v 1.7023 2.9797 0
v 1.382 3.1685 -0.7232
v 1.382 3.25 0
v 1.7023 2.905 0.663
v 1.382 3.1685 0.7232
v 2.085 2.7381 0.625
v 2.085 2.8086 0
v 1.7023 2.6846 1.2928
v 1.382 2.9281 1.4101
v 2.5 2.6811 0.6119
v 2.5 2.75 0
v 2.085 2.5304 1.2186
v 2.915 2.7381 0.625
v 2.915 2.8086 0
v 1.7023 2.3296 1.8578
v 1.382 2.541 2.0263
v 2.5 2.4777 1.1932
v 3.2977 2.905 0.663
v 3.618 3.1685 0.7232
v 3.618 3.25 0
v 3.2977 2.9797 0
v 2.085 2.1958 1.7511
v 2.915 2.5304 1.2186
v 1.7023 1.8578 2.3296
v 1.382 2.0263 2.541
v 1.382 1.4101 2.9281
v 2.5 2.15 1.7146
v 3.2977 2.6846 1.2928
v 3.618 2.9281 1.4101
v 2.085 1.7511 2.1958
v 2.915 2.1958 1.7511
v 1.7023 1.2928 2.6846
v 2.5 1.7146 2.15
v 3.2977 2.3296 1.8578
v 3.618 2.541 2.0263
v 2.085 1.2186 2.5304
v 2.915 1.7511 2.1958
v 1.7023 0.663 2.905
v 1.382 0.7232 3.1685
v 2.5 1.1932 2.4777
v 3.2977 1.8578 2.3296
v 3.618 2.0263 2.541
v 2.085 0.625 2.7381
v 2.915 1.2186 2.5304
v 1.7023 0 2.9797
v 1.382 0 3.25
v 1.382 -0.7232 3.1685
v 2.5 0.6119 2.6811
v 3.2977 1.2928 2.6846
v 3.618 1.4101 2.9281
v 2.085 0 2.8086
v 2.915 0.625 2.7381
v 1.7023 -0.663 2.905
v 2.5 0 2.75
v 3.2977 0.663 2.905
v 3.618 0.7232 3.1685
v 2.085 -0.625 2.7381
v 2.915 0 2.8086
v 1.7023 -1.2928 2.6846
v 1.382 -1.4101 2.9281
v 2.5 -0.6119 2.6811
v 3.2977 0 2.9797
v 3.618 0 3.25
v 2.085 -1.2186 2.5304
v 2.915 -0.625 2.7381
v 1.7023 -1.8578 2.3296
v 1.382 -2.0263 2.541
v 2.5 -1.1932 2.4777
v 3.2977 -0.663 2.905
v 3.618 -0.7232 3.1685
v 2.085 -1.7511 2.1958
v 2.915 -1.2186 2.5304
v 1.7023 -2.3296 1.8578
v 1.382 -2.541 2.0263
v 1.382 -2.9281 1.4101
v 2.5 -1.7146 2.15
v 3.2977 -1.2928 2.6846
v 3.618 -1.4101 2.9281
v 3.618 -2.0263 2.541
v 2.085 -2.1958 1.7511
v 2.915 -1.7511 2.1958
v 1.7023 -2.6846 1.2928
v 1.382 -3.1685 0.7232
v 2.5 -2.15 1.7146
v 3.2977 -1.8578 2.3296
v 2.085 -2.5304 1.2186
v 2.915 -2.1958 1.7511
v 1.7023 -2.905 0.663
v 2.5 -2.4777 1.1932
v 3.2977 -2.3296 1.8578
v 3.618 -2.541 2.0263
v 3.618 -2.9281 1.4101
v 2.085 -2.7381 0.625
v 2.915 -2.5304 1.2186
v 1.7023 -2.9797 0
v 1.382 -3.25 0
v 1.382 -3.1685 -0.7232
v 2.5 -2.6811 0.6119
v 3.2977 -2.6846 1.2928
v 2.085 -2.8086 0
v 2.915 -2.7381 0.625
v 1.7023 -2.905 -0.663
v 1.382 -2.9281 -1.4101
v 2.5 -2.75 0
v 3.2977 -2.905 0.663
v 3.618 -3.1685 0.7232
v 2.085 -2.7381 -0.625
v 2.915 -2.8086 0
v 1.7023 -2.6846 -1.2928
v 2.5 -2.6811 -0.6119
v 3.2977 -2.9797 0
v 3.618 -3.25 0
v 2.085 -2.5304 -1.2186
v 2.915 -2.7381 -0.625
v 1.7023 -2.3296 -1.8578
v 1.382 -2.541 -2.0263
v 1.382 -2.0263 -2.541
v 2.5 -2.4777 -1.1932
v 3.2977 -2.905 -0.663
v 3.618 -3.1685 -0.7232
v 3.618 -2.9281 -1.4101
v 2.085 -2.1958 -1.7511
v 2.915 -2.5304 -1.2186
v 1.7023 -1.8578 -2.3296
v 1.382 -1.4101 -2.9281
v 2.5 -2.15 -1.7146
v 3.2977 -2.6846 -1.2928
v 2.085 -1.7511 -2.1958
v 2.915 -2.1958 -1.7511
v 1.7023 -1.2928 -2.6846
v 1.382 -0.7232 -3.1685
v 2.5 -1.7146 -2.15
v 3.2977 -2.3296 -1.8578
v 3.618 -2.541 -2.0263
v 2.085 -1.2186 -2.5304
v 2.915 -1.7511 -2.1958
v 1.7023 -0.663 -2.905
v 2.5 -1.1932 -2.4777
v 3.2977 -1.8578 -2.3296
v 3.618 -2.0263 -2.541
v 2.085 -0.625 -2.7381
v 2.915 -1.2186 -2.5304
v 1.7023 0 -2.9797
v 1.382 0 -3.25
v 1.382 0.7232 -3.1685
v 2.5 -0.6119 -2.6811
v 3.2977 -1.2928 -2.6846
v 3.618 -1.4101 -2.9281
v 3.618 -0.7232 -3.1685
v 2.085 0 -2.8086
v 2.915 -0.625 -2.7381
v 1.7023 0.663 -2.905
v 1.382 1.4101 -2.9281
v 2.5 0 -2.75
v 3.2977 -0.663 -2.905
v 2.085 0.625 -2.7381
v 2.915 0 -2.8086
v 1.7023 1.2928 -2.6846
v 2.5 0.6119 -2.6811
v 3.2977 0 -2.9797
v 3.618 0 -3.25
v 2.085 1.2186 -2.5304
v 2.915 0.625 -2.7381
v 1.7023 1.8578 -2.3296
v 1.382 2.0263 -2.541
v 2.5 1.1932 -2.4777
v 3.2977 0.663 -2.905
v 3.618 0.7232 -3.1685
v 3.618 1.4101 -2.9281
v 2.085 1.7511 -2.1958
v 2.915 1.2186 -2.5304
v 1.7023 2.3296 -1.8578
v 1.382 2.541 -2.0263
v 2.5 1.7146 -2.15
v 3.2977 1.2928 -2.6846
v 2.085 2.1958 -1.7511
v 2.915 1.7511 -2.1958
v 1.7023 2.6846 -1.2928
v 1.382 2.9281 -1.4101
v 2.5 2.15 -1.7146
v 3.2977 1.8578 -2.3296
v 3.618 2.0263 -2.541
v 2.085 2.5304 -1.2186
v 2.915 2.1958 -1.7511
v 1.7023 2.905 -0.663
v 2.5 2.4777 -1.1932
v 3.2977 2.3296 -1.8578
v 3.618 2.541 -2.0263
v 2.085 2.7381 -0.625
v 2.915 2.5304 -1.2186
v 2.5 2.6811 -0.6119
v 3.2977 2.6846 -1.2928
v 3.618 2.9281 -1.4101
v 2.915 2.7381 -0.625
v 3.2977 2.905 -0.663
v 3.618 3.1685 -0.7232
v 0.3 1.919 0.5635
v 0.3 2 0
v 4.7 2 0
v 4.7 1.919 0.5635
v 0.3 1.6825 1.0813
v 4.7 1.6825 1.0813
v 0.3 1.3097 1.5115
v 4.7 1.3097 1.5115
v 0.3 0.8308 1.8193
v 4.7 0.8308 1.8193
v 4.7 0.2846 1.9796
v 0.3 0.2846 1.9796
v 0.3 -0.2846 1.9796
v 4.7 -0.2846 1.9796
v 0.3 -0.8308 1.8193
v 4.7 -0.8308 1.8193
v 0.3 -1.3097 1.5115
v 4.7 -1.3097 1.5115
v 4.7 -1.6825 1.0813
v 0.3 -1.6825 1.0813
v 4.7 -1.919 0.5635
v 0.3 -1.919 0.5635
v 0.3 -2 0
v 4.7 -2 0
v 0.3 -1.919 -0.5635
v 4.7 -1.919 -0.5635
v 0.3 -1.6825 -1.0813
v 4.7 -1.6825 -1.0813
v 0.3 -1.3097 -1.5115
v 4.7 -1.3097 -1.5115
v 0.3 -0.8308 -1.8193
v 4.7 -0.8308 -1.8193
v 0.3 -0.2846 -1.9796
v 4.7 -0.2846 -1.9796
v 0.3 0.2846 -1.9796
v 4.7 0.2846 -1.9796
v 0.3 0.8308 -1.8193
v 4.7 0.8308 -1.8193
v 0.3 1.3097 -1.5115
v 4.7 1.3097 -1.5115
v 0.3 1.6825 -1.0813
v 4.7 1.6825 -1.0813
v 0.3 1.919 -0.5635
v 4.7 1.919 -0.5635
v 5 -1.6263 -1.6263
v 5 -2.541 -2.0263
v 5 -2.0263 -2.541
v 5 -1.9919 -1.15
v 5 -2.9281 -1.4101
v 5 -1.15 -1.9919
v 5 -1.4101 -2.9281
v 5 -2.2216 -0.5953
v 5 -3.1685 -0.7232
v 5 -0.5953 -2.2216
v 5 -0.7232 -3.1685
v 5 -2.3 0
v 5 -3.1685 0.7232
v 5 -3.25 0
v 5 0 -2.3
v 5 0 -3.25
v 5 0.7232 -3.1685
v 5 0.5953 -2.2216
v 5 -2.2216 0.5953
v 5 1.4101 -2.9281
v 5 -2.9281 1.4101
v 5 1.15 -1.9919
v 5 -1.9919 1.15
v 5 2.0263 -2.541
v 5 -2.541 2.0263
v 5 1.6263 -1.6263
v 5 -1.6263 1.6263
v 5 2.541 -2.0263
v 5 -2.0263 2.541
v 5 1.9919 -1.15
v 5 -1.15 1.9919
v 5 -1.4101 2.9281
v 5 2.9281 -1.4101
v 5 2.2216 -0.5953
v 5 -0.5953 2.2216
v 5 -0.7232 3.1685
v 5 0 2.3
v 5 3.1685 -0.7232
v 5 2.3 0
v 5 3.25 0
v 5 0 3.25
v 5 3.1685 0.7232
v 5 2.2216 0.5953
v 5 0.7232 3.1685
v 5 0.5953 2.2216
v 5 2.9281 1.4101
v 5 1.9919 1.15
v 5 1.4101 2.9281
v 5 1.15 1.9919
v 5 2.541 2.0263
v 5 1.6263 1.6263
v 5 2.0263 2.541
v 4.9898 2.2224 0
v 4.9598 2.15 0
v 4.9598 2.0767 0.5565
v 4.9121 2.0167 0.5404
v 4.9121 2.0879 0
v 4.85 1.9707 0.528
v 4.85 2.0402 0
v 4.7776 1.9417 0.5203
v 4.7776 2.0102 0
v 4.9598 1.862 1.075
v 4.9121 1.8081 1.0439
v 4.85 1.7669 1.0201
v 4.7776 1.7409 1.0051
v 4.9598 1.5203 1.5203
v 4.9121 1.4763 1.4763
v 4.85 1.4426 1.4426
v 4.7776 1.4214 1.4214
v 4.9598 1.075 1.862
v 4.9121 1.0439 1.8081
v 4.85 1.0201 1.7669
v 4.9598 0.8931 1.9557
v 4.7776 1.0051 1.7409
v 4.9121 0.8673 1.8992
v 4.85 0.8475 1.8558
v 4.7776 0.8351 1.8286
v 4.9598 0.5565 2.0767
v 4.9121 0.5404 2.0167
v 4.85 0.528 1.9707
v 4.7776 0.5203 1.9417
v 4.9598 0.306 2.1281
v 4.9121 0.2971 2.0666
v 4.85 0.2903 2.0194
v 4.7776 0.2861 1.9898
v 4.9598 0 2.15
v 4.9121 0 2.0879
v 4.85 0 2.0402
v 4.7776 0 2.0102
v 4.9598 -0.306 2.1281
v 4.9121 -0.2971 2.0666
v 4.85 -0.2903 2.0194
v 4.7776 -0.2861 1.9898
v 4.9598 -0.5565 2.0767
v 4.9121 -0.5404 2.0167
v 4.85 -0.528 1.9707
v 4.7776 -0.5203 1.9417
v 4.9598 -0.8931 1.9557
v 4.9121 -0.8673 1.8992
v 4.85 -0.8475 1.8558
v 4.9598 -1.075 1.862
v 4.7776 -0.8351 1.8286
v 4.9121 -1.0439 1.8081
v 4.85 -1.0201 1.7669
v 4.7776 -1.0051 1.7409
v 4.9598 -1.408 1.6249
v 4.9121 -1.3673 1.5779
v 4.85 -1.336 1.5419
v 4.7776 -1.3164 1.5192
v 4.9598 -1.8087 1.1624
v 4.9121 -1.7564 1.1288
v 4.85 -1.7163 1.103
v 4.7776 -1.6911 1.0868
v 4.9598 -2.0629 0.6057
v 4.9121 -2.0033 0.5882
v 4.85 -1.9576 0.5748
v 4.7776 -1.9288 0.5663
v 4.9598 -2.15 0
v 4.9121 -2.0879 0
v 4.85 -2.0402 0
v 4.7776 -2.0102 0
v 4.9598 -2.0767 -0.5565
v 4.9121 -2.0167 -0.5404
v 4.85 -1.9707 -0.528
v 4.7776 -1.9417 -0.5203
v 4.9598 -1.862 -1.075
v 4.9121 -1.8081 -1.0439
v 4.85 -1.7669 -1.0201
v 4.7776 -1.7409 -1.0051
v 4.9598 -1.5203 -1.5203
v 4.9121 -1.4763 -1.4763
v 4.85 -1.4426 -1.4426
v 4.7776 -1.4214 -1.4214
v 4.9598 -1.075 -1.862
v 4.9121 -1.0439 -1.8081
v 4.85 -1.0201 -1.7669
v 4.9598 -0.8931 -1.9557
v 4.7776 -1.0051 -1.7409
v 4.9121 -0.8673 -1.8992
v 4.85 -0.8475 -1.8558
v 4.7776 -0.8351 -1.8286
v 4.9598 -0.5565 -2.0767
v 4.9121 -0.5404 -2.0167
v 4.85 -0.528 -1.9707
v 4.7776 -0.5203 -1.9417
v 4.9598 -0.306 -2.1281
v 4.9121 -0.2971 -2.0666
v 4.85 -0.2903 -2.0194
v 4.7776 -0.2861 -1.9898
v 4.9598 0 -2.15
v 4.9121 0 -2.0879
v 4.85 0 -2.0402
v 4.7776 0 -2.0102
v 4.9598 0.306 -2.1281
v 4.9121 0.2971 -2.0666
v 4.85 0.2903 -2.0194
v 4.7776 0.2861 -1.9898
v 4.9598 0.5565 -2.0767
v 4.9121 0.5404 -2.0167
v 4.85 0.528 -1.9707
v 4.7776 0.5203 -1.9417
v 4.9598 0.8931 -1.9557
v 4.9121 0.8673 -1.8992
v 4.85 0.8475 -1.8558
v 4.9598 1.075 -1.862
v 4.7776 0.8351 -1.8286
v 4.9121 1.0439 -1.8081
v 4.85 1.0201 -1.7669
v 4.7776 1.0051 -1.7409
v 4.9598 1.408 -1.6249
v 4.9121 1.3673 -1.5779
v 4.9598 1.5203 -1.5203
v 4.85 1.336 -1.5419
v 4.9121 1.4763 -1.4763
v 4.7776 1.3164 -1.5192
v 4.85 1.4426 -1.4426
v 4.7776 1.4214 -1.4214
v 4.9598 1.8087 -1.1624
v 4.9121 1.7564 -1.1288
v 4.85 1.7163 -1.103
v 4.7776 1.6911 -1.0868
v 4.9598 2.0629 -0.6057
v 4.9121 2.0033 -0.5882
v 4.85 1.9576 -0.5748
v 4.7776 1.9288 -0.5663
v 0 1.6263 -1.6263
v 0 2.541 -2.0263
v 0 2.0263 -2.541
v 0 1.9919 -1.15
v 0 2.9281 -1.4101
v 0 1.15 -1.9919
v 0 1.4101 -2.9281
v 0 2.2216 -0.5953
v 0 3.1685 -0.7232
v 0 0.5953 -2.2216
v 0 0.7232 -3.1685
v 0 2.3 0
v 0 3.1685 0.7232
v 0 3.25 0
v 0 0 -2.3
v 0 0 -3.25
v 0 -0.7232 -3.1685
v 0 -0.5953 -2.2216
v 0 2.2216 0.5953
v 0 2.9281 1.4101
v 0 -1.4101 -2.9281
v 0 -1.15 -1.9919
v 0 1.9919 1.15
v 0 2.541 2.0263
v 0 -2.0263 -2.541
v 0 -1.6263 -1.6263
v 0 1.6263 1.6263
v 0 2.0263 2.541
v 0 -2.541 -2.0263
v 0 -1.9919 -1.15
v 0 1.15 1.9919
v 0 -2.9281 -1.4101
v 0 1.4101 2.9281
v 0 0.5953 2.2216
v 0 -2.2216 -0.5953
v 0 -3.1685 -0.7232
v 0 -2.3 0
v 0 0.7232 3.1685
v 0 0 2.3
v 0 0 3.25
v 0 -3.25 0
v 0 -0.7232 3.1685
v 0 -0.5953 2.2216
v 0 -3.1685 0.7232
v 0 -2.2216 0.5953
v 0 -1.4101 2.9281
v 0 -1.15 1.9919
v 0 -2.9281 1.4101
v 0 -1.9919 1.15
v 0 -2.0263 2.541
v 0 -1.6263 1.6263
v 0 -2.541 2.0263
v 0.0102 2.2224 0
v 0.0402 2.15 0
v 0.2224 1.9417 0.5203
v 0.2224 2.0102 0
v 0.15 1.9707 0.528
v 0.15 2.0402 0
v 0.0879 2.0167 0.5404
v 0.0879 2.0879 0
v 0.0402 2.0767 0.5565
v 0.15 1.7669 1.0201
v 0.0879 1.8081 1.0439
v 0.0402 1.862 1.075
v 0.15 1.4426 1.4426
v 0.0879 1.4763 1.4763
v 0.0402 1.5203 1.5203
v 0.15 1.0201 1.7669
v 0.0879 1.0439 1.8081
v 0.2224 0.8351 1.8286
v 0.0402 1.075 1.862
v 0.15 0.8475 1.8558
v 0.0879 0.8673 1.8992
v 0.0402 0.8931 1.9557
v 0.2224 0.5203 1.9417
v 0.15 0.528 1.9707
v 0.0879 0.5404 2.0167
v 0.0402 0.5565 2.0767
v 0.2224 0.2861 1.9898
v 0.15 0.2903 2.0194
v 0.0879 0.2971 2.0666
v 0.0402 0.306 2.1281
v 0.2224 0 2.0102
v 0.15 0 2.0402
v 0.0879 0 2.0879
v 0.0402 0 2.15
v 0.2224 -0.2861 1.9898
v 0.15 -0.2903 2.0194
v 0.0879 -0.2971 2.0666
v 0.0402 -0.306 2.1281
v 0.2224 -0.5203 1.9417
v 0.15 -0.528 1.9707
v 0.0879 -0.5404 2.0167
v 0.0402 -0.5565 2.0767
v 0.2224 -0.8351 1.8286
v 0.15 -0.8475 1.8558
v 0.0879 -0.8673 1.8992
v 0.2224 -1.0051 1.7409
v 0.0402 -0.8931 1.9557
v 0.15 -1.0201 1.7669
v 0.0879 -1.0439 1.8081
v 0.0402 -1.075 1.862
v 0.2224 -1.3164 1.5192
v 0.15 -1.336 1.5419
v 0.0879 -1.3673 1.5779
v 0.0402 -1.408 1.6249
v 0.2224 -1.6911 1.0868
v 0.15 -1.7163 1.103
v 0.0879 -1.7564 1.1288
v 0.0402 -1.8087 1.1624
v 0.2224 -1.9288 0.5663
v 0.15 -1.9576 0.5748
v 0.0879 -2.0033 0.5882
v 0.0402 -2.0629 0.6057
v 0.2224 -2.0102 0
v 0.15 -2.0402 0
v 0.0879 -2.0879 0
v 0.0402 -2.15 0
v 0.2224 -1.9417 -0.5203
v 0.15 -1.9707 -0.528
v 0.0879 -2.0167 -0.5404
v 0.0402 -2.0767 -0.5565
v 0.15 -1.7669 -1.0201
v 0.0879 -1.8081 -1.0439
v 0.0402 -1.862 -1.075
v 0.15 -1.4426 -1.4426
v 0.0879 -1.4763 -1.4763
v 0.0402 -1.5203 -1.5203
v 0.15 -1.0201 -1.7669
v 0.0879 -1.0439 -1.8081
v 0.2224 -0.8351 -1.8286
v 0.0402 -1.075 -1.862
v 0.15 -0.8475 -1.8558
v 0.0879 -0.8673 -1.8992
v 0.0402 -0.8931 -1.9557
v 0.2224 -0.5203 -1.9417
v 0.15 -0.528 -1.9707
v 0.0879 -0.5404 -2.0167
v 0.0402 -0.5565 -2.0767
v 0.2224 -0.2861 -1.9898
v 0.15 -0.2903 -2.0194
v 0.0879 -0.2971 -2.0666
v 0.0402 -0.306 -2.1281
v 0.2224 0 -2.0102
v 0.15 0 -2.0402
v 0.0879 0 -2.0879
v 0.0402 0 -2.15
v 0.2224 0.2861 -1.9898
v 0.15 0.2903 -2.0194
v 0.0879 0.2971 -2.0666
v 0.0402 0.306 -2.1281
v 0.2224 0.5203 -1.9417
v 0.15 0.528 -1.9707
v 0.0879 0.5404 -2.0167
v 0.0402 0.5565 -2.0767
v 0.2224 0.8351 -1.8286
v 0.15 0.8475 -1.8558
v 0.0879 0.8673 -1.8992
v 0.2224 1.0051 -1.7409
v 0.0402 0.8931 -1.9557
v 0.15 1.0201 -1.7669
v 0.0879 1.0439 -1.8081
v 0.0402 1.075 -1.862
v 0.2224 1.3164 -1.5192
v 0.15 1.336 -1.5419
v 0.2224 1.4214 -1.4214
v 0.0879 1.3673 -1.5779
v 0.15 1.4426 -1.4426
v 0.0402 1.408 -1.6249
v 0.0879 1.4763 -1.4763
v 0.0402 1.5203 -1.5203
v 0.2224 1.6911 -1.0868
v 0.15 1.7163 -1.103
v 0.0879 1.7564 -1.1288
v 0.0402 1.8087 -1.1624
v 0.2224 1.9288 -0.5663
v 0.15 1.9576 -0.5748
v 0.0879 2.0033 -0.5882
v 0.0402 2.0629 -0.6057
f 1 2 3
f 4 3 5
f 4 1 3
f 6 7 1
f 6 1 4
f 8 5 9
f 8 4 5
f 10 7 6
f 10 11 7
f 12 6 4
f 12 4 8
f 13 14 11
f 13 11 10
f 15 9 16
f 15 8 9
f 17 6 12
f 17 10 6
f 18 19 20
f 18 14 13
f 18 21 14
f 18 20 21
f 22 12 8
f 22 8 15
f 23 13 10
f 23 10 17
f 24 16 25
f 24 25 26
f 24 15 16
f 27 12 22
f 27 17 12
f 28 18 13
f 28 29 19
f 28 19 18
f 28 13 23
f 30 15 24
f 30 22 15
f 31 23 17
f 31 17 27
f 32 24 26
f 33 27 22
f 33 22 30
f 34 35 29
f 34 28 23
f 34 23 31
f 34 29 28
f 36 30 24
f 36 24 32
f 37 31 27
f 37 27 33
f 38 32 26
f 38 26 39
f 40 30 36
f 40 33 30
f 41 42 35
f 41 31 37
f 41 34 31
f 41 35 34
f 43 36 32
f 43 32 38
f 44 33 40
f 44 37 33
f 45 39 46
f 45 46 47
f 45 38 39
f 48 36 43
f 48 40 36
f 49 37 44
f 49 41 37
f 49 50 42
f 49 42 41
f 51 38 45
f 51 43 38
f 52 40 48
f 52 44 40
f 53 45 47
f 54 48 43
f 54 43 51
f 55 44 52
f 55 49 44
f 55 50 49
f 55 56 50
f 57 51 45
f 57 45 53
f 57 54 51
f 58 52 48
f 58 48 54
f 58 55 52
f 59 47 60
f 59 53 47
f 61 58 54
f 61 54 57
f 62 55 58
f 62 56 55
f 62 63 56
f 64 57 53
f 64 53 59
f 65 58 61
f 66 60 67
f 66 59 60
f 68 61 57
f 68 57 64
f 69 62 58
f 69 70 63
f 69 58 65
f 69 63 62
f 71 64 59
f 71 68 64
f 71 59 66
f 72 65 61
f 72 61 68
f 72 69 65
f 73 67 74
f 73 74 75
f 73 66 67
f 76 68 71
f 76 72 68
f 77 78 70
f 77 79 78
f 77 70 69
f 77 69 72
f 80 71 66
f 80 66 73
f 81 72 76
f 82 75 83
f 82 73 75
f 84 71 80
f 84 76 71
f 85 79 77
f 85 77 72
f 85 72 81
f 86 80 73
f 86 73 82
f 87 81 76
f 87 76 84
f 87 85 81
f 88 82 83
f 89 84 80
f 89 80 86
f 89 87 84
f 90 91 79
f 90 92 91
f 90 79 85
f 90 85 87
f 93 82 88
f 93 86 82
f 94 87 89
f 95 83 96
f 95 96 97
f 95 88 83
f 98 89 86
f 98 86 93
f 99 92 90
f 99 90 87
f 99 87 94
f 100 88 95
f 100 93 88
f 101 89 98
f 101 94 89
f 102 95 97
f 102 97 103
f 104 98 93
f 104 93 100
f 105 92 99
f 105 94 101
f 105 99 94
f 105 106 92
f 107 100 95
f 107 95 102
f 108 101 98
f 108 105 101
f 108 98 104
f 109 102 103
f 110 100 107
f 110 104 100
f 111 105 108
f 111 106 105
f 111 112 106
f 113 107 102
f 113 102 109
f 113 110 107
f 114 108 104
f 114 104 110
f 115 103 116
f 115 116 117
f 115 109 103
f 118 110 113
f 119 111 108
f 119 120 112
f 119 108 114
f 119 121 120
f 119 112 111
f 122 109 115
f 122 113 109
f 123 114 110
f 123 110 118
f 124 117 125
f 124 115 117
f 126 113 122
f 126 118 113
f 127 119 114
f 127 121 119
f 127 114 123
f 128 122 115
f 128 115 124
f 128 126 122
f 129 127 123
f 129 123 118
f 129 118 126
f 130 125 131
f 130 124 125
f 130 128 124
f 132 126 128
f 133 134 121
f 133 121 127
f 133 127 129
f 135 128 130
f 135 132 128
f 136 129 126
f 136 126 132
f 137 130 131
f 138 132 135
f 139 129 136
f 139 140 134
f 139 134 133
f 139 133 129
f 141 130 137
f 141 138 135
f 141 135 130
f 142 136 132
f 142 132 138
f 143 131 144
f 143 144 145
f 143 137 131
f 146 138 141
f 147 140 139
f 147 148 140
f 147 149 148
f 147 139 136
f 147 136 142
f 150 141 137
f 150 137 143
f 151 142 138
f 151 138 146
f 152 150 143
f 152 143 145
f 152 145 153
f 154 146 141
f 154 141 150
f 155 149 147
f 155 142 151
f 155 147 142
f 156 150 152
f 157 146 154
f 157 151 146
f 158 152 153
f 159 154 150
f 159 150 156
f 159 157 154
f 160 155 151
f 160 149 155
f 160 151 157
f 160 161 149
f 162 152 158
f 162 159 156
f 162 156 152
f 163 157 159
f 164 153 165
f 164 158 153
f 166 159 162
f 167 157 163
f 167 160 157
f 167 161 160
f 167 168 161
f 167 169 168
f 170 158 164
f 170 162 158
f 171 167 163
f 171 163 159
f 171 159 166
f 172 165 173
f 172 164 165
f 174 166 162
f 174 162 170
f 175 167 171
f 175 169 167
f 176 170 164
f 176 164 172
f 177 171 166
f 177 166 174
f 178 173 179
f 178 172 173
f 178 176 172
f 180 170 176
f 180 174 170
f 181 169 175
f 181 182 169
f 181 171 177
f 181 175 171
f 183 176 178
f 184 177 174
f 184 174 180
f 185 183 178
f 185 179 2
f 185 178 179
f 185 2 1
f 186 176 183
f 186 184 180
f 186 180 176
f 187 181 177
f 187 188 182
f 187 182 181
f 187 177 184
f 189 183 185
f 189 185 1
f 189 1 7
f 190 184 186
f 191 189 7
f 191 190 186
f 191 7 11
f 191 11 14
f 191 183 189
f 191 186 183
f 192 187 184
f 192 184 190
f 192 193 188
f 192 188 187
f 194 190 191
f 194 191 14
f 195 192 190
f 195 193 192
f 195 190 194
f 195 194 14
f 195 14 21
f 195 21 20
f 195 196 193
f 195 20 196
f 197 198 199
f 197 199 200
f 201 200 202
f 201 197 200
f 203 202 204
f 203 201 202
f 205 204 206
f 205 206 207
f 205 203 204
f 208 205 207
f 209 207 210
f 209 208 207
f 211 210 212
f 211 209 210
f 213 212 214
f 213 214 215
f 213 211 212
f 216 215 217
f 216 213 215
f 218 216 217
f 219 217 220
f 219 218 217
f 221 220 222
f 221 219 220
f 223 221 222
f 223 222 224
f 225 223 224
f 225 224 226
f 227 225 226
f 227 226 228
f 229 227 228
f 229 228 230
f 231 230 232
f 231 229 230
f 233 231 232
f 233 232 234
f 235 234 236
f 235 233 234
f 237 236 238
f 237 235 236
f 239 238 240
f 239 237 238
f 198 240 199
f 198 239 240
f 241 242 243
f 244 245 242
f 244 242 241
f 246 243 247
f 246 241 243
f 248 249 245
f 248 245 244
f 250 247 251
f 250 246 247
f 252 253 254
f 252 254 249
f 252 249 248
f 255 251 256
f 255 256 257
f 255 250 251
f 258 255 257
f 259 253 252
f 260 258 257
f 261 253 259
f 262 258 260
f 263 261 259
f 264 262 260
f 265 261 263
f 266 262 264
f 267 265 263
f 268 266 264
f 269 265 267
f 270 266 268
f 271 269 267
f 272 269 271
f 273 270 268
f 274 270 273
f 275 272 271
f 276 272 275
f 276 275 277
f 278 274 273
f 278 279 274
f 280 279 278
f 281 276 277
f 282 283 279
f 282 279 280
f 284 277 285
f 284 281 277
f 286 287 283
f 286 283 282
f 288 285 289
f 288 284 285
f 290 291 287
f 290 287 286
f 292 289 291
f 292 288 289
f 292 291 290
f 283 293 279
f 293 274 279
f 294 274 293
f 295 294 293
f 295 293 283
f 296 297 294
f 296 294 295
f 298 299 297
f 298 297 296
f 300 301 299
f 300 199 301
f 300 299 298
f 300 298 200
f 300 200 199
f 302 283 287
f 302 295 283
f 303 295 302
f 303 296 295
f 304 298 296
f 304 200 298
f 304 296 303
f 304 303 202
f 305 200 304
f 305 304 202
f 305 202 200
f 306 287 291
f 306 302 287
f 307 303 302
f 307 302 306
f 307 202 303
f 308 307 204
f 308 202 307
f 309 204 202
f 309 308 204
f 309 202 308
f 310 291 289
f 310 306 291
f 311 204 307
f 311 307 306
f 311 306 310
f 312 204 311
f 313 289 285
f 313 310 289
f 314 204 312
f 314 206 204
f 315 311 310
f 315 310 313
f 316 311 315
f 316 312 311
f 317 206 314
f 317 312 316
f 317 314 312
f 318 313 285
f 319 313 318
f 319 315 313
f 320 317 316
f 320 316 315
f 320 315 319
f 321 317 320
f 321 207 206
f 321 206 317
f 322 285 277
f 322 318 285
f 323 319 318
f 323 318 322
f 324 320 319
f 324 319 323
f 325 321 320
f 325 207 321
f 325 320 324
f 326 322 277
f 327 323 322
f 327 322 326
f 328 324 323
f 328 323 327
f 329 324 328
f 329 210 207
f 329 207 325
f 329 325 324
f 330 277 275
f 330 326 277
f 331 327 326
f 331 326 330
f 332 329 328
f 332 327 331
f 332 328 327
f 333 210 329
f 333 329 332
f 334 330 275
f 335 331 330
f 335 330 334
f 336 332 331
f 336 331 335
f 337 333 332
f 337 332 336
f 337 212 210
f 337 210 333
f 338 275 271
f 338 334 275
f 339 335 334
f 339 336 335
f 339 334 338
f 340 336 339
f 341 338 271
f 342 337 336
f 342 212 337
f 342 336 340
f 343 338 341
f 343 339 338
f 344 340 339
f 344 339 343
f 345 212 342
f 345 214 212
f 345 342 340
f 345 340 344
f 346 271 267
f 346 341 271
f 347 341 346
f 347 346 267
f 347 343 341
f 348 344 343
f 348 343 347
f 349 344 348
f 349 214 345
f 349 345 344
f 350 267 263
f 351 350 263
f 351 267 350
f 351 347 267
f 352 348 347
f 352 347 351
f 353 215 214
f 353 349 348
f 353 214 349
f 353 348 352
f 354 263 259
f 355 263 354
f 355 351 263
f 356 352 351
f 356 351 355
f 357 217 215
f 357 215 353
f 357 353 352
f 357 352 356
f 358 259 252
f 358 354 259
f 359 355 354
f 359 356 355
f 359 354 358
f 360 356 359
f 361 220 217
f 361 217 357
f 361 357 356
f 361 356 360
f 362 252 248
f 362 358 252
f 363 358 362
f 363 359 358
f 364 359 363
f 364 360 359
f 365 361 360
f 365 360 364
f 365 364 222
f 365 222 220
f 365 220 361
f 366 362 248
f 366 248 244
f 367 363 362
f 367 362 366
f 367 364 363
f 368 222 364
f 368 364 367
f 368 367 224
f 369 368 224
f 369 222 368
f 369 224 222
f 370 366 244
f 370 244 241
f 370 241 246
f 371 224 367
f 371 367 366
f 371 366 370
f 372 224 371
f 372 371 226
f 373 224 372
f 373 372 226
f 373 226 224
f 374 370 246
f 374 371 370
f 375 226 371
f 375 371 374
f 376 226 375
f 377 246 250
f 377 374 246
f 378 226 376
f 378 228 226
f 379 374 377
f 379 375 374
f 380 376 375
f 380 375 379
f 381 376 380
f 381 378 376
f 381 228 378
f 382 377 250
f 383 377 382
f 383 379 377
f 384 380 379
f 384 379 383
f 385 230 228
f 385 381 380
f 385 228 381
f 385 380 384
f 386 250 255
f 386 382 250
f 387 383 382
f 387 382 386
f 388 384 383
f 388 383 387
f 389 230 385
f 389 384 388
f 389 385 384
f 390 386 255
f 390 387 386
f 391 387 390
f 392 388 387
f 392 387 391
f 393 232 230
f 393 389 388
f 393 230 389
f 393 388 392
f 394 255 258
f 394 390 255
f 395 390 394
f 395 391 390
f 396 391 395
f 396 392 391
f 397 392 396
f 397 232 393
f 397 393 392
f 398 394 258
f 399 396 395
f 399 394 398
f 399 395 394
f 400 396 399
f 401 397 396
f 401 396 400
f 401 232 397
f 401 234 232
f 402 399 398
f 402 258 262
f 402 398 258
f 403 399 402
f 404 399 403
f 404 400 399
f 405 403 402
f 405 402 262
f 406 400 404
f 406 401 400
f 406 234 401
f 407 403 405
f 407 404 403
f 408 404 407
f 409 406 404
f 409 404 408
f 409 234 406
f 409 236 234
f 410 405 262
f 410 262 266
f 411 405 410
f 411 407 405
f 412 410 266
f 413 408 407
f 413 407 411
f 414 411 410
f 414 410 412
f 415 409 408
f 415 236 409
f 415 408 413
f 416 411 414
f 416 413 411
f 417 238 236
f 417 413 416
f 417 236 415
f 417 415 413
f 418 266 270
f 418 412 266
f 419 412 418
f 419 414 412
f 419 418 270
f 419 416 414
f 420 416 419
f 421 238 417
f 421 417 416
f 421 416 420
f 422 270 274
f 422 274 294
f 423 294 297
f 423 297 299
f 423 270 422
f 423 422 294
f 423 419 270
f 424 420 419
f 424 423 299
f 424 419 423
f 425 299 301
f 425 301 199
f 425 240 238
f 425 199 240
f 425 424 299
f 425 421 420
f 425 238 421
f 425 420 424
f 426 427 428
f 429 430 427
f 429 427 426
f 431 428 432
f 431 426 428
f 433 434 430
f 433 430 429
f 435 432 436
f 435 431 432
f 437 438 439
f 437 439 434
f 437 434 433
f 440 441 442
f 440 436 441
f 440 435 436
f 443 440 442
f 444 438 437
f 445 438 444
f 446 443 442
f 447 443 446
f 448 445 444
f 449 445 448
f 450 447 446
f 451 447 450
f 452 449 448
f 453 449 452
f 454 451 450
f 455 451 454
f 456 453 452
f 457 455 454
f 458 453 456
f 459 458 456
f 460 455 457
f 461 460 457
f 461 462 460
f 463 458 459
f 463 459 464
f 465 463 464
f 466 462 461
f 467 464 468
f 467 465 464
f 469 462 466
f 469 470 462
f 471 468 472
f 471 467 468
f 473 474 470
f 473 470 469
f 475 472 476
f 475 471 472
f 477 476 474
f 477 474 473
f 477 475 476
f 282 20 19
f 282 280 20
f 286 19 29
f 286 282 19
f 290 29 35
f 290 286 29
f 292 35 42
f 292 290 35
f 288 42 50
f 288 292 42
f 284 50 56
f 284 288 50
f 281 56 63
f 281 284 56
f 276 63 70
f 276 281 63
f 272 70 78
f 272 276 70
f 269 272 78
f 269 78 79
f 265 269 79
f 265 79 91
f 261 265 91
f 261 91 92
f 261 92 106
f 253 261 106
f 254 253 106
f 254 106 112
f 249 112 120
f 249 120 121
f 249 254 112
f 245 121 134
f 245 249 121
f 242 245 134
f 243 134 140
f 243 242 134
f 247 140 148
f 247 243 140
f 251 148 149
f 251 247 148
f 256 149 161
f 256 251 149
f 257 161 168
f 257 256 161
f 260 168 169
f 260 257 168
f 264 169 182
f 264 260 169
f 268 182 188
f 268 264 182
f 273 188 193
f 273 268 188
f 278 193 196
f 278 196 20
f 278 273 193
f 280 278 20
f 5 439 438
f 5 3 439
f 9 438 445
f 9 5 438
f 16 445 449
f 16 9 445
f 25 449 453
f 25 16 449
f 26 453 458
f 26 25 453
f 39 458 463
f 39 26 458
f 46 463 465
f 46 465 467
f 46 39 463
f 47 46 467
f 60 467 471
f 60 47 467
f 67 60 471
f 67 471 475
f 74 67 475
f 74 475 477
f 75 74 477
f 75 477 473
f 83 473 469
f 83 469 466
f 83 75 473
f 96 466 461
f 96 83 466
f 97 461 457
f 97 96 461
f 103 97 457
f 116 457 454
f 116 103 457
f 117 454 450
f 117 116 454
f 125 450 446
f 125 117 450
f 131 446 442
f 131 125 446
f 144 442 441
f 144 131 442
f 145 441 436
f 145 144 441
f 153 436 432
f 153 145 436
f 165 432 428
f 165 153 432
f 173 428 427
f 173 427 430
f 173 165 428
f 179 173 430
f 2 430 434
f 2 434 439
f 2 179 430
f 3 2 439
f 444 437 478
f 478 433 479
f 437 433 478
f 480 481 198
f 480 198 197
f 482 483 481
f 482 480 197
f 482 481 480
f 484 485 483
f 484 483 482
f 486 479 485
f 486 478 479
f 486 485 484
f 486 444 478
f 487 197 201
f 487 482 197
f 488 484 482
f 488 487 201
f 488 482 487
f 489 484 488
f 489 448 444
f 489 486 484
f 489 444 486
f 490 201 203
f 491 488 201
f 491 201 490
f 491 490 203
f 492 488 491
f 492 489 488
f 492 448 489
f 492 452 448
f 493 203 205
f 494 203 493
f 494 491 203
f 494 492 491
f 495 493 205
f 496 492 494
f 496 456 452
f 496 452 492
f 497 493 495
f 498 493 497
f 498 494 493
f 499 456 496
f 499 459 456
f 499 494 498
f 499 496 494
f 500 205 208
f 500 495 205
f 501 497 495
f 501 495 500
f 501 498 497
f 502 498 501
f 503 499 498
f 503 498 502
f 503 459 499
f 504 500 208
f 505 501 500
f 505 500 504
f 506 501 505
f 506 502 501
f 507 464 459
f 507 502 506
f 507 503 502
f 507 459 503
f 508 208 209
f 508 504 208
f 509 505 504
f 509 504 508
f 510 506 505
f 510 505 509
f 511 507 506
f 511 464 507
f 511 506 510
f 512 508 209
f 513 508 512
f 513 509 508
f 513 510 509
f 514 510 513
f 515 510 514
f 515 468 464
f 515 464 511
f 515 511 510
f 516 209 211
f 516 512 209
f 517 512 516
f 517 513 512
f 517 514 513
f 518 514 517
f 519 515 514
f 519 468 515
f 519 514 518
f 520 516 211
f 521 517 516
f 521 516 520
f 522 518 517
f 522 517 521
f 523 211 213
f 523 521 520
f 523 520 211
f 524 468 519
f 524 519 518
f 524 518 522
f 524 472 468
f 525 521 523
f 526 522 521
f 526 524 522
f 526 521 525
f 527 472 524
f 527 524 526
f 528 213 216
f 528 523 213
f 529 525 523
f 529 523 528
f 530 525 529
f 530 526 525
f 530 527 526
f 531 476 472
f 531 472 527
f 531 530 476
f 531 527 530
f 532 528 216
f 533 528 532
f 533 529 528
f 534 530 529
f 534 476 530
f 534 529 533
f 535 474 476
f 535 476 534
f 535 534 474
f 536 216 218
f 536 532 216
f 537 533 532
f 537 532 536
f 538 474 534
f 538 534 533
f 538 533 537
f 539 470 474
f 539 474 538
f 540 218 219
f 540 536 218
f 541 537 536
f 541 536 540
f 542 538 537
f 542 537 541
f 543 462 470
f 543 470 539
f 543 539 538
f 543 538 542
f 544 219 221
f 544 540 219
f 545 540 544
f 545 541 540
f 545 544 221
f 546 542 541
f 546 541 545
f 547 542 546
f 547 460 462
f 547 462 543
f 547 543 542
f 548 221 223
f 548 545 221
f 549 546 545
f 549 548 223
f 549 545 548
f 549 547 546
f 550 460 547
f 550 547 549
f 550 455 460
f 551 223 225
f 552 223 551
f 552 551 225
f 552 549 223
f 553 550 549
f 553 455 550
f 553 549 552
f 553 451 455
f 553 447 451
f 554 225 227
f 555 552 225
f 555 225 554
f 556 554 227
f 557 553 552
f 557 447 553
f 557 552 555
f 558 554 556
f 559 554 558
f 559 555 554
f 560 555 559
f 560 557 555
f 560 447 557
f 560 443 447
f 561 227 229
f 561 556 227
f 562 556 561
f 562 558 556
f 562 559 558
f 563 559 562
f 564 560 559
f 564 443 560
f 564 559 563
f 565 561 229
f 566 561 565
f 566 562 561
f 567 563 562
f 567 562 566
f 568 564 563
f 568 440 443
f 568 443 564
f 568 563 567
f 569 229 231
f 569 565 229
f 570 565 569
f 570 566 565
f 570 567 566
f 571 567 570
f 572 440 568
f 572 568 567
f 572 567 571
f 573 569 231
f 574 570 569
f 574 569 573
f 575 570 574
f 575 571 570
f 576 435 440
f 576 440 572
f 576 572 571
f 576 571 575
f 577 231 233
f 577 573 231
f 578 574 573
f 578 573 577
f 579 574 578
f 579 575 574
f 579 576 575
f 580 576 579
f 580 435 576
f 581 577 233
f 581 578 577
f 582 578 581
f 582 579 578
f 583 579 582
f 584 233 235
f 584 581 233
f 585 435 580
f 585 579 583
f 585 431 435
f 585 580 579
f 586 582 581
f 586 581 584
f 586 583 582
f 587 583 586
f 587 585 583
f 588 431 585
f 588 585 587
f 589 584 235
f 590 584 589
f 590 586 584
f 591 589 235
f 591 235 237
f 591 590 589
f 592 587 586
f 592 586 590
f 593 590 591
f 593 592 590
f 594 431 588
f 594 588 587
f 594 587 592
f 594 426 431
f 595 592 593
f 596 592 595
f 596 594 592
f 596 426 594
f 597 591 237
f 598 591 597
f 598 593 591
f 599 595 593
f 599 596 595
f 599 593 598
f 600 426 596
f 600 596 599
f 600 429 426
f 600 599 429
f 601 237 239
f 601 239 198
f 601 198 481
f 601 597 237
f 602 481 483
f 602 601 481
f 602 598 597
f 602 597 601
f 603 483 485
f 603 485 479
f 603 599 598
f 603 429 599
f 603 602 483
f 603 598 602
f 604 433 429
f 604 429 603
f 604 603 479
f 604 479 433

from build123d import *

# Parameters (mm, degrees)
CONG_1_R = 0.3


with BuildPart() as part:
    # Esquisse1 → Base-Révolution (revolve)
    with BuildSketch(Plane.XY):
        with BuildLine():
            Line((3.618033989, 3.25), (5, 3.25))
            Line((5, 3.25), (5, 2))
            Line((5, 2), (0, 2))
            Line((0, 2), (0, 3.25))
            Line((0, 3.25), (1.381966011, 3.25))
            ThreePointArc((1.381966011, 3.25), (2.5, 2.75), (3.618033989, 3.25))
        make_face()
    revolve(axis=Axis((0, 0, 0), (1, 0, 0)))

    # Congé1
    cong_1_edges = [part.edges().sort_by_distance(p)[0] for p in [
        (5, -2, 0),
        (0, -2, 0),
    ]]
    fillet(cong_1_edges, radius=CONG_1_R)


solid = part.part
